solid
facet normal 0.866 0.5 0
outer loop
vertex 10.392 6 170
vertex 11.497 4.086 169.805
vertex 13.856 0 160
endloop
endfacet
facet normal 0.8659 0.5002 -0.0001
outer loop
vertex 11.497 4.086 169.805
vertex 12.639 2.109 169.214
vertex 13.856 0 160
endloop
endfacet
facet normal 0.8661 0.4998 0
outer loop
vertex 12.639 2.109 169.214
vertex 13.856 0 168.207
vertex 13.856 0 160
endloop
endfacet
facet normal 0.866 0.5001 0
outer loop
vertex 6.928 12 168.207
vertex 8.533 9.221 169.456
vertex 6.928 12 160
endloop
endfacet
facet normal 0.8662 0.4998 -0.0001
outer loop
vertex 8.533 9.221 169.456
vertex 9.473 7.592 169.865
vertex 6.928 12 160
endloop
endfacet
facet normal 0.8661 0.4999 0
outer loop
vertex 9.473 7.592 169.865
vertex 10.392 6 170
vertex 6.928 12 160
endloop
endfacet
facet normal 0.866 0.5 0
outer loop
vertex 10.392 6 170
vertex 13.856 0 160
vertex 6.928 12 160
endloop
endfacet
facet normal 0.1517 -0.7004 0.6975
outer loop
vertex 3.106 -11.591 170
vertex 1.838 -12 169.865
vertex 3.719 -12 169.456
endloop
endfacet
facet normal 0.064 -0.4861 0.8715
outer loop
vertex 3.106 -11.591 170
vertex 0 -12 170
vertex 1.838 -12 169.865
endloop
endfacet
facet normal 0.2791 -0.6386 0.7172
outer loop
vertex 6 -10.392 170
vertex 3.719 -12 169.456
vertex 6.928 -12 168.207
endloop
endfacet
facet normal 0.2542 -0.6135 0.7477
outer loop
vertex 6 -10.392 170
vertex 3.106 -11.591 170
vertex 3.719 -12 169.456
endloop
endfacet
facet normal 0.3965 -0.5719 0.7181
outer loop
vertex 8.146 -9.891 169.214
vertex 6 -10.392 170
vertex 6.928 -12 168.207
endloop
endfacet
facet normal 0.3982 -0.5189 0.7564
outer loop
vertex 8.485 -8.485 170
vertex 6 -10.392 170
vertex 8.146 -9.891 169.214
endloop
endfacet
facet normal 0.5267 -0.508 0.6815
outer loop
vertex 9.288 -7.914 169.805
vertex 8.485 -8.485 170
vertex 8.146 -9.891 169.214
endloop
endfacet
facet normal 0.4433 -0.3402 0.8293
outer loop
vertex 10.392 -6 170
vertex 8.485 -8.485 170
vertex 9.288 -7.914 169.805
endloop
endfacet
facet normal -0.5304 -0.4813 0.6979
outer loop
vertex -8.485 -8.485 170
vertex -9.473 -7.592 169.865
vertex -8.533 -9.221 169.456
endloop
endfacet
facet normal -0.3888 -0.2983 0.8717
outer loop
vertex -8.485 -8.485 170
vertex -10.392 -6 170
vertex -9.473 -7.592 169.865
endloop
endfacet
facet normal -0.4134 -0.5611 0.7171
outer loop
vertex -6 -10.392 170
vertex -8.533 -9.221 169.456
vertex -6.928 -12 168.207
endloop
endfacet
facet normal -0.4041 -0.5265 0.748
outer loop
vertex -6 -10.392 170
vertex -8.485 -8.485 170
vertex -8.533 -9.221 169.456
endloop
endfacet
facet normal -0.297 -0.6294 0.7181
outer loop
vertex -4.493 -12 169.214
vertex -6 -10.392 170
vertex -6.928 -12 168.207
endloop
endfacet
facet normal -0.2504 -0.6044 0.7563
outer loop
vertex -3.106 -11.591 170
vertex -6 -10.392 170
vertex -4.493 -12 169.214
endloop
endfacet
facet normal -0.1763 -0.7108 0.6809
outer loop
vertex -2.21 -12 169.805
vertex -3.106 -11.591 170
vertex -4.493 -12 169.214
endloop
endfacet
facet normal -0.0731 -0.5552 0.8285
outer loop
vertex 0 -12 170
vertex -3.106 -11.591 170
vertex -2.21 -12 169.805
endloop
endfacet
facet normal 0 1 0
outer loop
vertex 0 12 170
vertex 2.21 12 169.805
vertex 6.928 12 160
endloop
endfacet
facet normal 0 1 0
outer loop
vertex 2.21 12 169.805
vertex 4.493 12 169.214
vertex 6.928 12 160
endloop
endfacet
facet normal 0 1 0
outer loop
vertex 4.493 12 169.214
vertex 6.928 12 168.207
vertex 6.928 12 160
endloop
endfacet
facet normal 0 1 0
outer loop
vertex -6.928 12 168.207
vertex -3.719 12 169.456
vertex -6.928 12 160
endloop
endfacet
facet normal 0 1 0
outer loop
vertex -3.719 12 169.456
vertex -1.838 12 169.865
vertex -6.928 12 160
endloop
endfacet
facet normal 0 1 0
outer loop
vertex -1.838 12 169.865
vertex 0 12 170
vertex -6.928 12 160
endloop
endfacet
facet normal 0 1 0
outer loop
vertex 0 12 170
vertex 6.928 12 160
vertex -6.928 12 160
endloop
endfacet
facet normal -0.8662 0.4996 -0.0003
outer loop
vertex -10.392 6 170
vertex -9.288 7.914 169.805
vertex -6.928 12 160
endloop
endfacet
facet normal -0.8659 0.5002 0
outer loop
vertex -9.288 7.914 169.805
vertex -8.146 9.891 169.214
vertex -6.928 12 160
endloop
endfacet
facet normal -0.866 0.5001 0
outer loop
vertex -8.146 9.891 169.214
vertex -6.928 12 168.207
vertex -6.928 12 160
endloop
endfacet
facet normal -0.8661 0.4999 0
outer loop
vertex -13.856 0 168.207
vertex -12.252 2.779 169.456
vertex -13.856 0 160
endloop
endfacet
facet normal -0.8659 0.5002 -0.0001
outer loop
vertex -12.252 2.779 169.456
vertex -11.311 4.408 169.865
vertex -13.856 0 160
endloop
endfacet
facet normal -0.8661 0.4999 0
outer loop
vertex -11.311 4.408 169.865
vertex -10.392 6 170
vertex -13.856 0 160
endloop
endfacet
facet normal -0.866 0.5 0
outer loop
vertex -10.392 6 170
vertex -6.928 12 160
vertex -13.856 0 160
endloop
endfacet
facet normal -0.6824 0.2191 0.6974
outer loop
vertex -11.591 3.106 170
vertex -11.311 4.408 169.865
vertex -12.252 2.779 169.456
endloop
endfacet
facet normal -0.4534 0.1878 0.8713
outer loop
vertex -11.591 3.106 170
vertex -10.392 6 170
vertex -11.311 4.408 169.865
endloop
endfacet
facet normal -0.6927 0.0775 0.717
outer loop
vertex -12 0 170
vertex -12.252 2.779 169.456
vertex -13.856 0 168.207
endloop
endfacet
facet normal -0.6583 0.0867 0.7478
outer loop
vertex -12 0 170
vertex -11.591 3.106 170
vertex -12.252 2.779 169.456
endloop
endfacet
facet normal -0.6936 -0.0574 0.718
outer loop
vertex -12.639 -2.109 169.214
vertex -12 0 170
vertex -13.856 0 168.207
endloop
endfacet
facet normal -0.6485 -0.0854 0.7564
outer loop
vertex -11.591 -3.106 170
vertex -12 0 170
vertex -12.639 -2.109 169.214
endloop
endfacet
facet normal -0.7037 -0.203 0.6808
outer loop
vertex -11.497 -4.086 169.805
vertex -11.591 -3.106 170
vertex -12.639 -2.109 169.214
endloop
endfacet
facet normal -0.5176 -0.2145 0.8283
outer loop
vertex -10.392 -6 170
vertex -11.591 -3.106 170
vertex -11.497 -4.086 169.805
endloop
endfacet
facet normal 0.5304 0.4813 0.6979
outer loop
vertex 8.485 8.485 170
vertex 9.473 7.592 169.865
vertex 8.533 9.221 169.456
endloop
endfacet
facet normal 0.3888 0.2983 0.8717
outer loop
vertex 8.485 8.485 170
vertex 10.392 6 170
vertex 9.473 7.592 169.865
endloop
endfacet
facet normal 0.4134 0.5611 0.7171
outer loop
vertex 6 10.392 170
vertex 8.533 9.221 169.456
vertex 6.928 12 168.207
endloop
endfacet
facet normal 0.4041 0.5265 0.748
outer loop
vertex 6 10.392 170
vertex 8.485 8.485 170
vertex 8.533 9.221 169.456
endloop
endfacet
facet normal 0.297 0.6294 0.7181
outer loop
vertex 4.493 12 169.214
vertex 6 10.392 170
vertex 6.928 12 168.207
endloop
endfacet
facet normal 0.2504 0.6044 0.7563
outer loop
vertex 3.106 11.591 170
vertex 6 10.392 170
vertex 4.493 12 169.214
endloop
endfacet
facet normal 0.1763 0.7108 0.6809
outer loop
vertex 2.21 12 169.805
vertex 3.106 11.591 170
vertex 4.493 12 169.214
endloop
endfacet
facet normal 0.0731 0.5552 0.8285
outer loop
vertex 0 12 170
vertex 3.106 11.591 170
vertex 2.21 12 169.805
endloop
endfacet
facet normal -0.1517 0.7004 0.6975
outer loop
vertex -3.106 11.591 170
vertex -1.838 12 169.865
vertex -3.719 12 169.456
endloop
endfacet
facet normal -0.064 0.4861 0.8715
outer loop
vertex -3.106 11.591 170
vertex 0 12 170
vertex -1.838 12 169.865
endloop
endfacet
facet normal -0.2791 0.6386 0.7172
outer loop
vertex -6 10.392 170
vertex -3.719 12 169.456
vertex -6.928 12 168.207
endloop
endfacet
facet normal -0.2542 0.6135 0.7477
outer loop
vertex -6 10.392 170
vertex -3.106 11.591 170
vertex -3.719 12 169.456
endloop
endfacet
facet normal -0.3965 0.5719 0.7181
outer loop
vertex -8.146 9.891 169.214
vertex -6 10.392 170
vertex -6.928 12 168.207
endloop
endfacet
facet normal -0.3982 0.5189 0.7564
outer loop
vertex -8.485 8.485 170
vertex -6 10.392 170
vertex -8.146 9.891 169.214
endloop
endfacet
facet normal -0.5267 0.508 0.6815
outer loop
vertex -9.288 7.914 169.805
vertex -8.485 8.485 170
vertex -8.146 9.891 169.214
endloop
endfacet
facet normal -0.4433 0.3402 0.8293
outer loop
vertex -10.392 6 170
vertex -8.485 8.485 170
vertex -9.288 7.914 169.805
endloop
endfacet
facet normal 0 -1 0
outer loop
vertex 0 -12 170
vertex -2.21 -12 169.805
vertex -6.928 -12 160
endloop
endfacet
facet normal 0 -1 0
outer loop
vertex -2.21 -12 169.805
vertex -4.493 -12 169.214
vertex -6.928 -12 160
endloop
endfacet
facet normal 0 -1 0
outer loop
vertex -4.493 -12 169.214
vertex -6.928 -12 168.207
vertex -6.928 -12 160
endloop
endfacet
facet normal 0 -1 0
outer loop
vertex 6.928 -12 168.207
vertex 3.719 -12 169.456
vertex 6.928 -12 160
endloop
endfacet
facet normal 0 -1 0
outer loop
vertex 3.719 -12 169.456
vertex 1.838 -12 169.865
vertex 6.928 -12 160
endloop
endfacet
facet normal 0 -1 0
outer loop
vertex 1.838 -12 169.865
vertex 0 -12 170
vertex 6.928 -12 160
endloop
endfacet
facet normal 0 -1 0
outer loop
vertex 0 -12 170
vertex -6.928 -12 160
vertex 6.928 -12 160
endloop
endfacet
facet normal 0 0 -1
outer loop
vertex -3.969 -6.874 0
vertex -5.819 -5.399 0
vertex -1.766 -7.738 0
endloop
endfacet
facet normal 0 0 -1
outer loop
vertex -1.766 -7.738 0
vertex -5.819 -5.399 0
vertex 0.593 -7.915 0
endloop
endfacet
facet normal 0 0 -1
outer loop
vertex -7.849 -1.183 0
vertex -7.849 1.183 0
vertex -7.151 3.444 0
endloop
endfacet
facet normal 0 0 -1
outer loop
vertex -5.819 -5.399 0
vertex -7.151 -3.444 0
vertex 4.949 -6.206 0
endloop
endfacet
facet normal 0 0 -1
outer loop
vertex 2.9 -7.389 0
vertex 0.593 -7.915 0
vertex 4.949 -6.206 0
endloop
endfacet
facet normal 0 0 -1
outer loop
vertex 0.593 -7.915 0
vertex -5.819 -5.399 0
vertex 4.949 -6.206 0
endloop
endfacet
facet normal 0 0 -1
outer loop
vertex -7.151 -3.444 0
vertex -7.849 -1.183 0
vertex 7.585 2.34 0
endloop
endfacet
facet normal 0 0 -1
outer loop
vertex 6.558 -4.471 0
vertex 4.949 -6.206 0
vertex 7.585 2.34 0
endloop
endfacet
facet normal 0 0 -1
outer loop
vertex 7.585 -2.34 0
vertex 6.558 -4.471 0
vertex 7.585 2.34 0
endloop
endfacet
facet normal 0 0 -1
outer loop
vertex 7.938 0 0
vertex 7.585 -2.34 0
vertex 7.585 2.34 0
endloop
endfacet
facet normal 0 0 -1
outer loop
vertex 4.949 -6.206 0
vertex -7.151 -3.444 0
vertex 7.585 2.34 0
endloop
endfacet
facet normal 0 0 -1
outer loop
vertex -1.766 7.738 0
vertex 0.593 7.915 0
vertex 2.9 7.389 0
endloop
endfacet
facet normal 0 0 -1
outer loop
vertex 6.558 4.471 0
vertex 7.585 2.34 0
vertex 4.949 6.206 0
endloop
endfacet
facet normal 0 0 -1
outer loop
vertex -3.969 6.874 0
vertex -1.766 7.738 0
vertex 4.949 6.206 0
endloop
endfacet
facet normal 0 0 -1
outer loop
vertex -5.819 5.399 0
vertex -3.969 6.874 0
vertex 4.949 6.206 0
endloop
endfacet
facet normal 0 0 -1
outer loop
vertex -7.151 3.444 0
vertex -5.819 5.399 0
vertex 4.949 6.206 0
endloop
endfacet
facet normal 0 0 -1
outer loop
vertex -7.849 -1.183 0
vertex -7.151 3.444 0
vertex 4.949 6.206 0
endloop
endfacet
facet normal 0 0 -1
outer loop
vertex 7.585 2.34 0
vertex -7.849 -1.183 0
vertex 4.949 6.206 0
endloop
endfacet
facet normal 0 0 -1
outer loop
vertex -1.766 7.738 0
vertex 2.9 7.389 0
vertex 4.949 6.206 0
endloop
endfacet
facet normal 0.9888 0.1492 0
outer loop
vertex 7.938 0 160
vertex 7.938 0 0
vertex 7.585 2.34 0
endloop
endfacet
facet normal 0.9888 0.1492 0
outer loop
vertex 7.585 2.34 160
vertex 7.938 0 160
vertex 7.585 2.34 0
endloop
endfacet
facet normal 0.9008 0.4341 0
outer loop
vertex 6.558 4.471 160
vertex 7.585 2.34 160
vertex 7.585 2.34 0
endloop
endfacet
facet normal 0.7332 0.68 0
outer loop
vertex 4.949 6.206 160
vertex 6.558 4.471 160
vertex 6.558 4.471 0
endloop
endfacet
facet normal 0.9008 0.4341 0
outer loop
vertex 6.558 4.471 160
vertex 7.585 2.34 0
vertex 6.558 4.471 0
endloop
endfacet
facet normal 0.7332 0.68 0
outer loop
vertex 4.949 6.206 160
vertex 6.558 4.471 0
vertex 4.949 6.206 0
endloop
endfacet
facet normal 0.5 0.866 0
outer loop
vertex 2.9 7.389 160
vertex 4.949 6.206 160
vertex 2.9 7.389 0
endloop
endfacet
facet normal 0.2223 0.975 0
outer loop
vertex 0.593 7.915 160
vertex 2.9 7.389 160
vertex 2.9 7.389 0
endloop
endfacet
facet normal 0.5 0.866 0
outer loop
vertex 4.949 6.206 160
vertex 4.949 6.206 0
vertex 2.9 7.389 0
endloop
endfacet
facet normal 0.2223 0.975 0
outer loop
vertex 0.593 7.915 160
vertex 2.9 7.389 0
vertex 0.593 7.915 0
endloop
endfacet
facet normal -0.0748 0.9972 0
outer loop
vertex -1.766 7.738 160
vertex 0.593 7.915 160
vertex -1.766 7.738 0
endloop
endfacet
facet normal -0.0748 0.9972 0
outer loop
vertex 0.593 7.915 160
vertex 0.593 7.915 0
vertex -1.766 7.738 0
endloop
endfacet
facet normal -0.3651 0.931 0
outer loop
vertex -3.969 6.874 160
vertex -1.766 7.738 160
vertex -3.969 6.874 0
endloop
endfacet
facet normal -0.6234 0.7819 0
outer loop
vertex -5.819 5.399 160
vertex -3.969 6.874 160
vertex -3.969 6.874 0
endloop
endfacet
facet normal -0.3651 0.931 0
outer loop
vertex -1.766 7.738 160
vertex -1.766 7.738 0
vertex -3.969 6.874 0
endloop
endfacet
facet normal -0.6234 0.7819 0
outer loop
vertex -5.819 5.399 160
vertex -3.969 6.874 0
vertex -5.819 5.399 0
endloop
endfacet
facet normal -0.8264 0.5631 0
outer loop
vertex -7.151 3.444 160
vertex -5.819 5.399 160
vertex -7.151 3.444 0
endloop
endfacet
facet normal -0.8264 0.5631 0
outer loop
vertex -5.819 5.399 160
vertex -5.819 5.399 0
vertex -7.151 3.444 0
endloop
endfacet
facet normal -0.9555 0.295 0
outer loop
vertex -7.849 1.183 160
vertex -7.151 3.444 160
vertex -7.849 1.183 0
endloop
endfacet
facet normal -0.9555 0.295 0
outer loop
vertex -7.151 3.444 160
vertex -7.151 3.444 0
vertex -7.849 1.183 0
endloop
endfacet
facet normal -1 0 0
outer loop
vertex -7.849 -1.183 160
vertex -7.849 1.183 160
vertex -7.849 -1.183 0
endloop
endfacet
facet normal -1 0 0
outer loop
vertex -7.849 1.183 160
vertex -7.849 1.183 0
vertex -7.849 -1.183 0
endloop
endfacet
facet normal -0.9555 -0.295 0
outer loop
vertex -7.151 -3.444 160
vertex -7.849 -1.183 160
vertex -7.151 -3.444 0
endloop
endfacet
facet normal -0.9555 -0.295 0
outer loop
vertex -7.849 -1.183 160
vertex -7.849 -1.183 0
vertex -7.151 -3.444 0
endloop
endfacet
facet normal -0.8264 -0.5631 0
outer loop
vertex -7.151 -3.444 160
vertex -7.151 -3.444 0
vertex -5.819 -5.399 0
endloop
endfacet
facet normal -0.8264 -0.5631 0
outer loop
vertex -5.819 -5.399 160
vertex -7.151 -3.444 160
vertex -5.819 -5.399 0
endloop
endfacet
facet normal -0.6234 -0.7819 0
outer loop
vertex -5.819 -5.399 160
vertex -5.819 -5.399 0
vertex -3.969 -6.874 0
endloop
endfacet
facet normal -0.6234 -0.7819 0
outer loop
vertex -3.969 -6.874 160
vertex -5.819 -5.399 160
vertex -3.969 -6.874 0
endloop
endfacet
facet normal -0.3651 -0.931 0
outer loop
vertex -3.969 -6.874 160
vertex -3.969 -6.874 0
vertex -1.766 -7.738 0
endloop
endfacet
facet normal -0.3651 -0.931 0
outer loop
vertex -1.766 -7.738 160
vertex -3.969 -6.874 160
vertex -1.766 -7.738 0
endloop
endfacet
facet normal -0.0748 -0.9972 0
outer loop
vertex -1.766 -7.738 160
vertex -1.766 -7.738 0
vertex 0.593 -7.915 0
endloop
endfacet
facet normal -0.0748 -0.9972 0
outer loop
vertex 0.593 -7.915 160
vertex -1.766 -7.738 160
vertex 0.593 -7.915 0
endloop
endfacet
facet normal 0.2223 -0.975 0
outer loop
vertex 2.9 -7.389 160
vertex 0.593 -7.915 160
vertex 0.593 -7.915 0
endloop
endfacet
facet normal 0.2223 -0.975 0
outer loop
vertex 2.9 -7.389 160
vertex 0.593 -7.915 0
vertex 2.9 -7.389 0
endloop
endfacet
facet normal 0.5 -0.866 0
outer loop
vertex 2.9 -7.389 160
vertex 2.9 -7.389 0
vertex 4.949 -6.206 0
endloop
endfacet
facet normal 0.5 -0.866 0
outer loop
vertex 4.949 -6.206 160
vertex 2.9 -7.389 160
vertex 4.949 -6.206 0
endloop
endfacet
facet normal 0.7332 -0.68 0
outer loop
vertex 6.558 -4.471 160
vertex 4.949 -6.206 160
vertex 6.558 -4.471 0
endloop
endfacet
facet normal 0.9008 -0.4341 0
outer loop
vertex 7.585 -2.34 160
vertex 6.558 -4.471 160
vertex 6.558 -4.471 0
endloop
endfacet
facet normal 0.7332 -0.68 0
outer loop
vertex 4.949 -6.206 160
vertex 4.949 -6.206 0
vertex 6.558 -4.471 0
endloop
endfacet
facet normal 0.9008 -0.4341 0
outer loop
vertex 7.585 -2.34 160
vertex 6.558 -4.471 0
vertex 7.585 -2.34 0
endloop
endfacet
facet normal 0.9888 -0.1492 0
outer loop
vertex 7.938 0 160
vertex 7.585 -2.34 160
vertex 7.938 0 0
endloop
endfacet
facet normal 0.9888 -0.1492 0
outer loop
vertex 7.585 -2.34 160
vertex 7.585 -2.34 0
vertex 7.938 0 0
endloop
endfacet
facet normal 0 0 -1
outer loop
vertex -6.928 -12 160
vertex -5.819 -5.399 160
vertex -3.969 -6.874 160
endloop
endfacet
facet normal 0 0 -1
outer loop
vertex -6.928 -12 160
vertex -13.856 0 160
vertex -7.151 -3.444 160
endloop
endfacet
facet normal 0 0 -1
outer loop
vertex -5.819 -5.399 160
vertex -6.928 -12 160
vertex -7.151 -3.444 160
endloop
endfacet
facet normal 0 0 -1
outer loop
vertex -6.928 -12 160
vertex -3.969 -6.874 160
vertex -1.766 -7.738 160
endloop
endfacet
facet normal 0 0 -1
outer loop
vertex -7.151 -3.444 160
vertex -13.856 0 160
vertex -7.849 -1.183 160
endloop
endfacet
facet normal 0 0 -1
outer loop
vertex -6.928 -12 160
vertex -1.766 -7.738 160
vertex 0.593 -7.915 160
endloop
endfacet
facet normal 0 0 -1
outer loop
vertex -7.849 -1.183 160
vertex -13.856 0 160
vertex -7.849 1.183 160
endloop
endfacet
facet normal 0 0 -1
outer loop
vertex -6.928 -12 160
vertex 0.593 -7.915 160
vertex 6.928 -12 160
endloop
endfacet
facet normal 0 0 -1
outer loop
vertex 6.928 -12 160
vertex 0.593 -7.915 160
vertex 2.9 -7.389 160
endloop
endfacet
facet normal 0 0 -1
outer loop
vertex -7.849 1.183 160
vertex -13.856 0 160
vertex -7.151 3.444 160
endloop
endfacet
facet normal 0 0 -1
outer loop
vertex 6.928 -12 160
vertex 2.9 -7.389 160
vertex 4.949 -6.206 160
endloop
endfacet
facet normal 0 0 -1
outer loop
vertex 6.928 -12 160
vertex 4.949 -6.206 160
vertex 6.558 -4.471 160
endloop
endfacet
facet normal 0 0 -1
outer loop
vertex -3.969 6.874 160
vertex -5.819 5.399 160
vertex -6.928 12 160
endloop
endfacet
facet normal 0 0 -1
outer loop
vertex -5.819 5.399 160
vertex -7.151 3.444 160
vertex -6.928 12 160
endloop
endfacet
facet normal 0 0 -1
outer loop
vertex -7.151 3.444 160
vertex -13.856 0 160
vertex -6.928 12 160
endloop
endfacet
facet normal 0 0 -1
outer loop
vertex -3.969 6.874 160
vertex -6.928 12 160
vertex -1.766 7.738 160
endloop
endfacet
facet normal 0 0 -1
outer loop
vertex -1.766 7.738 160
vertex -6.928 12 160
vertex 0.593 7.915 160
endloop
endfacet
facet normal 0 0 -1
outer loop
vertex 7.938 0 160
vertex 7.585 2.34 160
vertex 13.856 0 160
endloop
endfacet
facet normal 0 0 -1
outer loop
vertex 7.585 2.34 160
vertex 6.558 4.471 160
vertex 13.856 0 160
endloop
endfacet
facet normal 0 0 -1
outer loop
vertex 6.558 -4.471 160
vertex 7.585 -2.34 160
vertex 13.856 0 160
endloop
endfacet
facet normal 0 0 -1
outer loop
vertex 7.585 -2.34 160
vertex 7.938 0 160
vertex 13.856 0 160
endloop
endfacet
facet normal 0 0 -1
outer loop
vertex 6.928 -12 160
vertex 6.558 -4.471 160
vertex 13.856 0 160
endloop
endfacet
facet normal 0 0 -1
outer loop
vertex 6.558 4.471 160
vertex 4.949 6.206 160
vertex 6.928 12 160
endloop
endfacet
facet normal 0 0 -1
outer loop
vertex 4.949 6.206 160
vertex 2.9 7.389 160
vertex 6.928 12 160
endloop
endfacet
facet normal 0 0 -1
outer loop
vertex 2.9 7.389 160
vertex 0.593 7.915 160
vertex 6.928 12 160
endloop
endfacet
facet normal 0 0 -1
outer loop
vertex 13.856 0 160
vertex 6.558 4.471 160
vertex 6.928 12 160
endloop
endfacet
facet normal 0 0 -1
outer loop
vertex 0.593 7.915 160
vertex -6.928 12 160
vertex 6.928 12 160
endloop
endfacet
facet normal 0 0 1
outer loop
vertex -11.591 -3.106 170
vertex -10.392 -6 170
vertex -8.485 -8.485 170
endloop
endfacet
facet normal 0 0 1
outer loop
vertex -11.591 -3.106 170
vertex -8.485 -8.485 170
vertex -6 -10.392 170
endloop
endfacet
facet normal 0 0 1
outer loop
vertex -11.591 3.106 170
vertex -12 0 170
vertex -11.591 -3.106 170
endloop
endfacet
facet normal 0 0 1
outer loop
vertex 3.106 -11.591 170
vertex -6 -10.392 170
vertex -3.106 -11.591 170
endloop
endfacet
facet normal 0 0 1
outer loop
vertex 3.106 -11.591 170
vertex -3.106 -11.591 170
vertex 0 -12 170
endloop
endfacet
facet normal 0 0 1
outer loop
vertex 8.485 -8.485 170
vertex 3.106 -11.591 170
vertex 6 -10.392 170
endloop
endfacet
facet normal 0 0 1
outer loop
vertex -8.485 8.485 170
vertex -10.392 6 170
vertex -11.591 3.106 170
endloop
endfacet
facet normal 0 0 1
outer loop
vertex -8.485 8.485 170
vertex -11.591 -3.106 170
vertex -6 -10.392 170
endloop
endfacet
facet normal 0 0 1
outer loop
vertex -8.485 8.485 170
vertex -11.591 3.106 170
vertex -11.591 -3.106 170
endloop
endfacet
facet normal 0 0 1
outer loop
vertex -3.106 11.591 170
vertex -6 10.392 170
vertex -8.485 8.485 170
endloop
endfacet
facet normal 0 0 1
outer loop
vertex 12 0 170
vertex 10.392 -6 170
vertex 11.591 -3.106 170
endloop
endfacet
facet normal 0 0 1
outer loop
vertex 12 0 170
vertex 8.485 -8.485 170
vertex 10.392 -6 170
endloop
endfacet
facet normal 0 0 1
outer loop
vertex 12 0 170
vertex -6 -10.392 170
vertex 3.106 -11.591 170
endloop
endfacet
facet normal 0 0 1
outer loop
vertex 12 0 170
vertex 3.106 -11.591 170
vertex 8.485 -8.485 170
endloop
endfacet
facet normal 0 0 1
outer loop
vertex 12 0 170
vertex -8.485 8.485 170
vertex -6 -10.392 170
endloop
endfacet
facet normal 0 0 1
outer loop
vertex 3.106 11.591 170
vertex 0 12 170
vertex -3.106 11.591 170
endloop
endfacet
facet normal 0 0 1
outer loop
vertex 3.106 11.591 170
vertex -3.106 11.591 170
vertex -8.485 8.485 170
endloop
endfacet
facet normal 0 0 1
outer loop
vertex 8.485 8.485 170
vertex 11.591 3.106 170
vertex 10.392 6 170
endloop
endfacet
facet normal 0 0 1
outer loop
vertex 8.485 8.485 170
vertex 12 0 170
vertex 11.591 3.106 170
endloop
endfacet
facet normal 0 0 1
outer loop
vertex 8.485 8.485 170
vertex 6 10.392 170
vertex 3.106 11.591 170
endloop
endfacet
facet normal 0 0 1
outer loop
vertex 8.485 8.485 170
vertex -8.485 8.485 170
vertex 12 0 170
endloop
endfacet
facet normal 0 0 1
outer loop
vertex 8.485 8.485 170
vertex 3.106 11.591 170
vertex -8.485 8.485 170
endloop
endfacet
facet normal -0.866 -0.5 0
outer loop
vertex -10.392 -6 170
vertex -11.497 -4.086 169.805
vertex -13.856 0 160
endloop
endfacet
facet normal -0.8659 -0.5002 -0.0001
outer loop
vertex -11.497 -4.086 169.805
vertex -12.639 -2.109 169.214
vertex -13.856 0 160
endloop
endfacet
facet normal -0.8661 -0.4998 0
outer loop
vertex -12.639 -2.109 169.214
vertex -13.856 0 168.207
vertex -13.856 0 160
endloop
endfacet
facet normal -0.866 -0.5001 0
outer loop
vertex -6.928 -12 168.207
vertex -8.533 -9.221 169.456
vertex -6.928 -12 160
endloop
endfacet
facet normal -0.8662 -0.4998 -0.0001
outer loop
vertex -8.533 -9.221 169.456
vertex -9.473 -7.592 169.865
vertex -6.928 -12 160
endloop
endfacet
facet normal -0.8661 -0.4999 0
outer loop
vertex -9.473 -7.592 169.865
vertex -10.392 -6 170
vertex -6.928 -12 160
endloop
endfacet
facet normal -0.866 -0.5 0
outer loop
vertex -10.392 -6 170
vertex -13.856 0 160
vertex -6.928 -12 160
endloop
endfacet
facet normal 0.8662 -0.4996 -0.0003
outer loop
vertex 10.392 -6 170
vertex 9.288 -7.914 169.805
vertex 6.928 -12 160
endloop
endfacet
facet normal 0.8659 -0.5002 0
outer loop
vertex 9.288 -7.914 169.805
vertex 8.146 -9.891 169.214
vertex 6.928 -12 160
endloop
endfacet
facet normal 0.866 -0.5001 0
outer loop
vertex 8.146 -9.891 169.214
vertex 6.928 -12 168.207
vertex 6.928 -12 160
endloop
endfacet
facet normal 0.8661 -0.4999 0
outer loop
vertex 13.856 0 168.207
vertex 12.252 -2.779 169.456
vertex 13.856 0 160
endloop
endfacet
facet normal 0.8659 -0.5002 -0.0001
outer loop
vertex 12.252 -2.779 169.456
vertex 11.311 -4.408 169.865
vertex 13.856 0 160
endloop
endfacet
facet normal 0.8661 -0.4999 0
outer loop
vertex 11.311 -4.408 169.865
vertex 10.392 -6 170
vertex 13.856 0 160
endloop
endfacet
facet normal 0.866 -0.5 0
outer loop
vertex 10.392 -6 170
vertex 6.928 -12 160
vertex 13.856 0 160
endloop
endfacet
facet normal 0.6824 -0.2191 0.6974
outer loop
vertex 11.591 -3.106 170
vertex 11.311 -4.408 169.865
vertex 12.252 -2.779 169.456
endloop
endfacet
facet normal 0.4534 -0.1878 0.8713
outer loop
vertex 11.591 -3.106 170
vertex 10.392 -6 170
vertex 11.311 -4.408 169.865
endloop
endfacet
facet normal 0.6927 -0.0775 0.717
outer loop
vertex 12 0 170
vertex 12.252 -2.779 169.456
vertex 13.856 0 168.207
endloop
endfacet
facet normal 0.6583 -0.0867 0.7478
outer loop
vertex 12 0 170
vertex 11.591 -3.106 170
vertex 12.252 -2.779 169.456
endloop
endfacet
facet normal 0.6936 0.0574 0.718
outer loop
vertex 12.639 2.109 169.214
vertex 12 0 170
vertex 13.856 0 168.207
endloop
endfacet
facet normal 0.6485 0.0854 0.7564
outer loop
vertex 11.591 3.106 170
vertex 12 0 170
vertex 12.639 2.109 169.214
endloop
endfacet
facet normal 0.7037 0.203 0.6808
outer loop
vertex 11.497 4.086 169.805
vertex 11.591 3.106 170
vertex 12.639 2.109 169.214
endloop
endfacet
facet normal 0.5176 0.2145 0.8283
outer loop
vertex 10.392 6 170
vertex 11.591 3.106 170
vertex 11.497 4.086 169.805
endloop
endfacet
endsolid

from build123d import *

# Parameters (mm, degrees)
CROQUIS1_R              = 7.9375
SALIENTE_EXTRUIR1_DEPTH = 160
SALIENTE_EXTRUIR2_DEPTH = 10
CROQUIS3_R              = 34.921607703
CROQUIS3_R_2            = 12
CORTAR_EXTRUIR1_DEPTH   = 6
CORTAR_EXTRUIR1_DRAFT   = -46


with BuildPart() as part:
    # Croquis1 → Saliente-Extruir1 (new body)
    with BuildSketch(Plane.XY):
        Circle(CROQUIS1_R)
    extrude(amount=SALIENTE_EXTRUIR1_DEPTH)

    # Croquis2 → Saliente-Extruir2 (add)
    with BuildSketch(Plane.XY.offset(160)):
        Polygon((13.856406461, 0), (6.92820323, 12), (-6.92820323, 12), (-13.856406461, 0), (-6.92820323, -12), (6.92820323, -12), align=None)
    extrude(amount=SALIENTE_EXTRUIR2_DEPTH)


with BuildPart() as cortar_extruir1_tool:
    # Croquis3 → Cortar-Extruir1 (with draft: the straight prism first)
    with BuildSketch(Plane.XY.offset(170)):
        Circle(CROQUIS3_R)
        Circle(CROQUIS3_R_2, mode=Mode.SUBTRACT)
    extrude(amount=-CORTAR_EXTRUIR1_DEPTH)
    # Cortar-Extruir1: the draft: its side faces are tilted about the plane it starts from
    cortar_extruir1_sides = [cortar_extruir1_tool.faces().sort_by_distance(p)[0] for p in [
        (-34.921607703, 0, 167),
        (-12, 0, 167),
    ]]
    draft(cortar_extruir1_sides, Plane.XY.offset(170), CORTAR_EXTRUIR1_DRAFT)


with BuildPart() as part_1:
    add(part.part)

    # Cortar-Extruir1: cut by cortar_extruir1_tool
    add(cortar_extruir1_tool.part, mode=Mode.SUBTRACT)


solid = part_1.part
